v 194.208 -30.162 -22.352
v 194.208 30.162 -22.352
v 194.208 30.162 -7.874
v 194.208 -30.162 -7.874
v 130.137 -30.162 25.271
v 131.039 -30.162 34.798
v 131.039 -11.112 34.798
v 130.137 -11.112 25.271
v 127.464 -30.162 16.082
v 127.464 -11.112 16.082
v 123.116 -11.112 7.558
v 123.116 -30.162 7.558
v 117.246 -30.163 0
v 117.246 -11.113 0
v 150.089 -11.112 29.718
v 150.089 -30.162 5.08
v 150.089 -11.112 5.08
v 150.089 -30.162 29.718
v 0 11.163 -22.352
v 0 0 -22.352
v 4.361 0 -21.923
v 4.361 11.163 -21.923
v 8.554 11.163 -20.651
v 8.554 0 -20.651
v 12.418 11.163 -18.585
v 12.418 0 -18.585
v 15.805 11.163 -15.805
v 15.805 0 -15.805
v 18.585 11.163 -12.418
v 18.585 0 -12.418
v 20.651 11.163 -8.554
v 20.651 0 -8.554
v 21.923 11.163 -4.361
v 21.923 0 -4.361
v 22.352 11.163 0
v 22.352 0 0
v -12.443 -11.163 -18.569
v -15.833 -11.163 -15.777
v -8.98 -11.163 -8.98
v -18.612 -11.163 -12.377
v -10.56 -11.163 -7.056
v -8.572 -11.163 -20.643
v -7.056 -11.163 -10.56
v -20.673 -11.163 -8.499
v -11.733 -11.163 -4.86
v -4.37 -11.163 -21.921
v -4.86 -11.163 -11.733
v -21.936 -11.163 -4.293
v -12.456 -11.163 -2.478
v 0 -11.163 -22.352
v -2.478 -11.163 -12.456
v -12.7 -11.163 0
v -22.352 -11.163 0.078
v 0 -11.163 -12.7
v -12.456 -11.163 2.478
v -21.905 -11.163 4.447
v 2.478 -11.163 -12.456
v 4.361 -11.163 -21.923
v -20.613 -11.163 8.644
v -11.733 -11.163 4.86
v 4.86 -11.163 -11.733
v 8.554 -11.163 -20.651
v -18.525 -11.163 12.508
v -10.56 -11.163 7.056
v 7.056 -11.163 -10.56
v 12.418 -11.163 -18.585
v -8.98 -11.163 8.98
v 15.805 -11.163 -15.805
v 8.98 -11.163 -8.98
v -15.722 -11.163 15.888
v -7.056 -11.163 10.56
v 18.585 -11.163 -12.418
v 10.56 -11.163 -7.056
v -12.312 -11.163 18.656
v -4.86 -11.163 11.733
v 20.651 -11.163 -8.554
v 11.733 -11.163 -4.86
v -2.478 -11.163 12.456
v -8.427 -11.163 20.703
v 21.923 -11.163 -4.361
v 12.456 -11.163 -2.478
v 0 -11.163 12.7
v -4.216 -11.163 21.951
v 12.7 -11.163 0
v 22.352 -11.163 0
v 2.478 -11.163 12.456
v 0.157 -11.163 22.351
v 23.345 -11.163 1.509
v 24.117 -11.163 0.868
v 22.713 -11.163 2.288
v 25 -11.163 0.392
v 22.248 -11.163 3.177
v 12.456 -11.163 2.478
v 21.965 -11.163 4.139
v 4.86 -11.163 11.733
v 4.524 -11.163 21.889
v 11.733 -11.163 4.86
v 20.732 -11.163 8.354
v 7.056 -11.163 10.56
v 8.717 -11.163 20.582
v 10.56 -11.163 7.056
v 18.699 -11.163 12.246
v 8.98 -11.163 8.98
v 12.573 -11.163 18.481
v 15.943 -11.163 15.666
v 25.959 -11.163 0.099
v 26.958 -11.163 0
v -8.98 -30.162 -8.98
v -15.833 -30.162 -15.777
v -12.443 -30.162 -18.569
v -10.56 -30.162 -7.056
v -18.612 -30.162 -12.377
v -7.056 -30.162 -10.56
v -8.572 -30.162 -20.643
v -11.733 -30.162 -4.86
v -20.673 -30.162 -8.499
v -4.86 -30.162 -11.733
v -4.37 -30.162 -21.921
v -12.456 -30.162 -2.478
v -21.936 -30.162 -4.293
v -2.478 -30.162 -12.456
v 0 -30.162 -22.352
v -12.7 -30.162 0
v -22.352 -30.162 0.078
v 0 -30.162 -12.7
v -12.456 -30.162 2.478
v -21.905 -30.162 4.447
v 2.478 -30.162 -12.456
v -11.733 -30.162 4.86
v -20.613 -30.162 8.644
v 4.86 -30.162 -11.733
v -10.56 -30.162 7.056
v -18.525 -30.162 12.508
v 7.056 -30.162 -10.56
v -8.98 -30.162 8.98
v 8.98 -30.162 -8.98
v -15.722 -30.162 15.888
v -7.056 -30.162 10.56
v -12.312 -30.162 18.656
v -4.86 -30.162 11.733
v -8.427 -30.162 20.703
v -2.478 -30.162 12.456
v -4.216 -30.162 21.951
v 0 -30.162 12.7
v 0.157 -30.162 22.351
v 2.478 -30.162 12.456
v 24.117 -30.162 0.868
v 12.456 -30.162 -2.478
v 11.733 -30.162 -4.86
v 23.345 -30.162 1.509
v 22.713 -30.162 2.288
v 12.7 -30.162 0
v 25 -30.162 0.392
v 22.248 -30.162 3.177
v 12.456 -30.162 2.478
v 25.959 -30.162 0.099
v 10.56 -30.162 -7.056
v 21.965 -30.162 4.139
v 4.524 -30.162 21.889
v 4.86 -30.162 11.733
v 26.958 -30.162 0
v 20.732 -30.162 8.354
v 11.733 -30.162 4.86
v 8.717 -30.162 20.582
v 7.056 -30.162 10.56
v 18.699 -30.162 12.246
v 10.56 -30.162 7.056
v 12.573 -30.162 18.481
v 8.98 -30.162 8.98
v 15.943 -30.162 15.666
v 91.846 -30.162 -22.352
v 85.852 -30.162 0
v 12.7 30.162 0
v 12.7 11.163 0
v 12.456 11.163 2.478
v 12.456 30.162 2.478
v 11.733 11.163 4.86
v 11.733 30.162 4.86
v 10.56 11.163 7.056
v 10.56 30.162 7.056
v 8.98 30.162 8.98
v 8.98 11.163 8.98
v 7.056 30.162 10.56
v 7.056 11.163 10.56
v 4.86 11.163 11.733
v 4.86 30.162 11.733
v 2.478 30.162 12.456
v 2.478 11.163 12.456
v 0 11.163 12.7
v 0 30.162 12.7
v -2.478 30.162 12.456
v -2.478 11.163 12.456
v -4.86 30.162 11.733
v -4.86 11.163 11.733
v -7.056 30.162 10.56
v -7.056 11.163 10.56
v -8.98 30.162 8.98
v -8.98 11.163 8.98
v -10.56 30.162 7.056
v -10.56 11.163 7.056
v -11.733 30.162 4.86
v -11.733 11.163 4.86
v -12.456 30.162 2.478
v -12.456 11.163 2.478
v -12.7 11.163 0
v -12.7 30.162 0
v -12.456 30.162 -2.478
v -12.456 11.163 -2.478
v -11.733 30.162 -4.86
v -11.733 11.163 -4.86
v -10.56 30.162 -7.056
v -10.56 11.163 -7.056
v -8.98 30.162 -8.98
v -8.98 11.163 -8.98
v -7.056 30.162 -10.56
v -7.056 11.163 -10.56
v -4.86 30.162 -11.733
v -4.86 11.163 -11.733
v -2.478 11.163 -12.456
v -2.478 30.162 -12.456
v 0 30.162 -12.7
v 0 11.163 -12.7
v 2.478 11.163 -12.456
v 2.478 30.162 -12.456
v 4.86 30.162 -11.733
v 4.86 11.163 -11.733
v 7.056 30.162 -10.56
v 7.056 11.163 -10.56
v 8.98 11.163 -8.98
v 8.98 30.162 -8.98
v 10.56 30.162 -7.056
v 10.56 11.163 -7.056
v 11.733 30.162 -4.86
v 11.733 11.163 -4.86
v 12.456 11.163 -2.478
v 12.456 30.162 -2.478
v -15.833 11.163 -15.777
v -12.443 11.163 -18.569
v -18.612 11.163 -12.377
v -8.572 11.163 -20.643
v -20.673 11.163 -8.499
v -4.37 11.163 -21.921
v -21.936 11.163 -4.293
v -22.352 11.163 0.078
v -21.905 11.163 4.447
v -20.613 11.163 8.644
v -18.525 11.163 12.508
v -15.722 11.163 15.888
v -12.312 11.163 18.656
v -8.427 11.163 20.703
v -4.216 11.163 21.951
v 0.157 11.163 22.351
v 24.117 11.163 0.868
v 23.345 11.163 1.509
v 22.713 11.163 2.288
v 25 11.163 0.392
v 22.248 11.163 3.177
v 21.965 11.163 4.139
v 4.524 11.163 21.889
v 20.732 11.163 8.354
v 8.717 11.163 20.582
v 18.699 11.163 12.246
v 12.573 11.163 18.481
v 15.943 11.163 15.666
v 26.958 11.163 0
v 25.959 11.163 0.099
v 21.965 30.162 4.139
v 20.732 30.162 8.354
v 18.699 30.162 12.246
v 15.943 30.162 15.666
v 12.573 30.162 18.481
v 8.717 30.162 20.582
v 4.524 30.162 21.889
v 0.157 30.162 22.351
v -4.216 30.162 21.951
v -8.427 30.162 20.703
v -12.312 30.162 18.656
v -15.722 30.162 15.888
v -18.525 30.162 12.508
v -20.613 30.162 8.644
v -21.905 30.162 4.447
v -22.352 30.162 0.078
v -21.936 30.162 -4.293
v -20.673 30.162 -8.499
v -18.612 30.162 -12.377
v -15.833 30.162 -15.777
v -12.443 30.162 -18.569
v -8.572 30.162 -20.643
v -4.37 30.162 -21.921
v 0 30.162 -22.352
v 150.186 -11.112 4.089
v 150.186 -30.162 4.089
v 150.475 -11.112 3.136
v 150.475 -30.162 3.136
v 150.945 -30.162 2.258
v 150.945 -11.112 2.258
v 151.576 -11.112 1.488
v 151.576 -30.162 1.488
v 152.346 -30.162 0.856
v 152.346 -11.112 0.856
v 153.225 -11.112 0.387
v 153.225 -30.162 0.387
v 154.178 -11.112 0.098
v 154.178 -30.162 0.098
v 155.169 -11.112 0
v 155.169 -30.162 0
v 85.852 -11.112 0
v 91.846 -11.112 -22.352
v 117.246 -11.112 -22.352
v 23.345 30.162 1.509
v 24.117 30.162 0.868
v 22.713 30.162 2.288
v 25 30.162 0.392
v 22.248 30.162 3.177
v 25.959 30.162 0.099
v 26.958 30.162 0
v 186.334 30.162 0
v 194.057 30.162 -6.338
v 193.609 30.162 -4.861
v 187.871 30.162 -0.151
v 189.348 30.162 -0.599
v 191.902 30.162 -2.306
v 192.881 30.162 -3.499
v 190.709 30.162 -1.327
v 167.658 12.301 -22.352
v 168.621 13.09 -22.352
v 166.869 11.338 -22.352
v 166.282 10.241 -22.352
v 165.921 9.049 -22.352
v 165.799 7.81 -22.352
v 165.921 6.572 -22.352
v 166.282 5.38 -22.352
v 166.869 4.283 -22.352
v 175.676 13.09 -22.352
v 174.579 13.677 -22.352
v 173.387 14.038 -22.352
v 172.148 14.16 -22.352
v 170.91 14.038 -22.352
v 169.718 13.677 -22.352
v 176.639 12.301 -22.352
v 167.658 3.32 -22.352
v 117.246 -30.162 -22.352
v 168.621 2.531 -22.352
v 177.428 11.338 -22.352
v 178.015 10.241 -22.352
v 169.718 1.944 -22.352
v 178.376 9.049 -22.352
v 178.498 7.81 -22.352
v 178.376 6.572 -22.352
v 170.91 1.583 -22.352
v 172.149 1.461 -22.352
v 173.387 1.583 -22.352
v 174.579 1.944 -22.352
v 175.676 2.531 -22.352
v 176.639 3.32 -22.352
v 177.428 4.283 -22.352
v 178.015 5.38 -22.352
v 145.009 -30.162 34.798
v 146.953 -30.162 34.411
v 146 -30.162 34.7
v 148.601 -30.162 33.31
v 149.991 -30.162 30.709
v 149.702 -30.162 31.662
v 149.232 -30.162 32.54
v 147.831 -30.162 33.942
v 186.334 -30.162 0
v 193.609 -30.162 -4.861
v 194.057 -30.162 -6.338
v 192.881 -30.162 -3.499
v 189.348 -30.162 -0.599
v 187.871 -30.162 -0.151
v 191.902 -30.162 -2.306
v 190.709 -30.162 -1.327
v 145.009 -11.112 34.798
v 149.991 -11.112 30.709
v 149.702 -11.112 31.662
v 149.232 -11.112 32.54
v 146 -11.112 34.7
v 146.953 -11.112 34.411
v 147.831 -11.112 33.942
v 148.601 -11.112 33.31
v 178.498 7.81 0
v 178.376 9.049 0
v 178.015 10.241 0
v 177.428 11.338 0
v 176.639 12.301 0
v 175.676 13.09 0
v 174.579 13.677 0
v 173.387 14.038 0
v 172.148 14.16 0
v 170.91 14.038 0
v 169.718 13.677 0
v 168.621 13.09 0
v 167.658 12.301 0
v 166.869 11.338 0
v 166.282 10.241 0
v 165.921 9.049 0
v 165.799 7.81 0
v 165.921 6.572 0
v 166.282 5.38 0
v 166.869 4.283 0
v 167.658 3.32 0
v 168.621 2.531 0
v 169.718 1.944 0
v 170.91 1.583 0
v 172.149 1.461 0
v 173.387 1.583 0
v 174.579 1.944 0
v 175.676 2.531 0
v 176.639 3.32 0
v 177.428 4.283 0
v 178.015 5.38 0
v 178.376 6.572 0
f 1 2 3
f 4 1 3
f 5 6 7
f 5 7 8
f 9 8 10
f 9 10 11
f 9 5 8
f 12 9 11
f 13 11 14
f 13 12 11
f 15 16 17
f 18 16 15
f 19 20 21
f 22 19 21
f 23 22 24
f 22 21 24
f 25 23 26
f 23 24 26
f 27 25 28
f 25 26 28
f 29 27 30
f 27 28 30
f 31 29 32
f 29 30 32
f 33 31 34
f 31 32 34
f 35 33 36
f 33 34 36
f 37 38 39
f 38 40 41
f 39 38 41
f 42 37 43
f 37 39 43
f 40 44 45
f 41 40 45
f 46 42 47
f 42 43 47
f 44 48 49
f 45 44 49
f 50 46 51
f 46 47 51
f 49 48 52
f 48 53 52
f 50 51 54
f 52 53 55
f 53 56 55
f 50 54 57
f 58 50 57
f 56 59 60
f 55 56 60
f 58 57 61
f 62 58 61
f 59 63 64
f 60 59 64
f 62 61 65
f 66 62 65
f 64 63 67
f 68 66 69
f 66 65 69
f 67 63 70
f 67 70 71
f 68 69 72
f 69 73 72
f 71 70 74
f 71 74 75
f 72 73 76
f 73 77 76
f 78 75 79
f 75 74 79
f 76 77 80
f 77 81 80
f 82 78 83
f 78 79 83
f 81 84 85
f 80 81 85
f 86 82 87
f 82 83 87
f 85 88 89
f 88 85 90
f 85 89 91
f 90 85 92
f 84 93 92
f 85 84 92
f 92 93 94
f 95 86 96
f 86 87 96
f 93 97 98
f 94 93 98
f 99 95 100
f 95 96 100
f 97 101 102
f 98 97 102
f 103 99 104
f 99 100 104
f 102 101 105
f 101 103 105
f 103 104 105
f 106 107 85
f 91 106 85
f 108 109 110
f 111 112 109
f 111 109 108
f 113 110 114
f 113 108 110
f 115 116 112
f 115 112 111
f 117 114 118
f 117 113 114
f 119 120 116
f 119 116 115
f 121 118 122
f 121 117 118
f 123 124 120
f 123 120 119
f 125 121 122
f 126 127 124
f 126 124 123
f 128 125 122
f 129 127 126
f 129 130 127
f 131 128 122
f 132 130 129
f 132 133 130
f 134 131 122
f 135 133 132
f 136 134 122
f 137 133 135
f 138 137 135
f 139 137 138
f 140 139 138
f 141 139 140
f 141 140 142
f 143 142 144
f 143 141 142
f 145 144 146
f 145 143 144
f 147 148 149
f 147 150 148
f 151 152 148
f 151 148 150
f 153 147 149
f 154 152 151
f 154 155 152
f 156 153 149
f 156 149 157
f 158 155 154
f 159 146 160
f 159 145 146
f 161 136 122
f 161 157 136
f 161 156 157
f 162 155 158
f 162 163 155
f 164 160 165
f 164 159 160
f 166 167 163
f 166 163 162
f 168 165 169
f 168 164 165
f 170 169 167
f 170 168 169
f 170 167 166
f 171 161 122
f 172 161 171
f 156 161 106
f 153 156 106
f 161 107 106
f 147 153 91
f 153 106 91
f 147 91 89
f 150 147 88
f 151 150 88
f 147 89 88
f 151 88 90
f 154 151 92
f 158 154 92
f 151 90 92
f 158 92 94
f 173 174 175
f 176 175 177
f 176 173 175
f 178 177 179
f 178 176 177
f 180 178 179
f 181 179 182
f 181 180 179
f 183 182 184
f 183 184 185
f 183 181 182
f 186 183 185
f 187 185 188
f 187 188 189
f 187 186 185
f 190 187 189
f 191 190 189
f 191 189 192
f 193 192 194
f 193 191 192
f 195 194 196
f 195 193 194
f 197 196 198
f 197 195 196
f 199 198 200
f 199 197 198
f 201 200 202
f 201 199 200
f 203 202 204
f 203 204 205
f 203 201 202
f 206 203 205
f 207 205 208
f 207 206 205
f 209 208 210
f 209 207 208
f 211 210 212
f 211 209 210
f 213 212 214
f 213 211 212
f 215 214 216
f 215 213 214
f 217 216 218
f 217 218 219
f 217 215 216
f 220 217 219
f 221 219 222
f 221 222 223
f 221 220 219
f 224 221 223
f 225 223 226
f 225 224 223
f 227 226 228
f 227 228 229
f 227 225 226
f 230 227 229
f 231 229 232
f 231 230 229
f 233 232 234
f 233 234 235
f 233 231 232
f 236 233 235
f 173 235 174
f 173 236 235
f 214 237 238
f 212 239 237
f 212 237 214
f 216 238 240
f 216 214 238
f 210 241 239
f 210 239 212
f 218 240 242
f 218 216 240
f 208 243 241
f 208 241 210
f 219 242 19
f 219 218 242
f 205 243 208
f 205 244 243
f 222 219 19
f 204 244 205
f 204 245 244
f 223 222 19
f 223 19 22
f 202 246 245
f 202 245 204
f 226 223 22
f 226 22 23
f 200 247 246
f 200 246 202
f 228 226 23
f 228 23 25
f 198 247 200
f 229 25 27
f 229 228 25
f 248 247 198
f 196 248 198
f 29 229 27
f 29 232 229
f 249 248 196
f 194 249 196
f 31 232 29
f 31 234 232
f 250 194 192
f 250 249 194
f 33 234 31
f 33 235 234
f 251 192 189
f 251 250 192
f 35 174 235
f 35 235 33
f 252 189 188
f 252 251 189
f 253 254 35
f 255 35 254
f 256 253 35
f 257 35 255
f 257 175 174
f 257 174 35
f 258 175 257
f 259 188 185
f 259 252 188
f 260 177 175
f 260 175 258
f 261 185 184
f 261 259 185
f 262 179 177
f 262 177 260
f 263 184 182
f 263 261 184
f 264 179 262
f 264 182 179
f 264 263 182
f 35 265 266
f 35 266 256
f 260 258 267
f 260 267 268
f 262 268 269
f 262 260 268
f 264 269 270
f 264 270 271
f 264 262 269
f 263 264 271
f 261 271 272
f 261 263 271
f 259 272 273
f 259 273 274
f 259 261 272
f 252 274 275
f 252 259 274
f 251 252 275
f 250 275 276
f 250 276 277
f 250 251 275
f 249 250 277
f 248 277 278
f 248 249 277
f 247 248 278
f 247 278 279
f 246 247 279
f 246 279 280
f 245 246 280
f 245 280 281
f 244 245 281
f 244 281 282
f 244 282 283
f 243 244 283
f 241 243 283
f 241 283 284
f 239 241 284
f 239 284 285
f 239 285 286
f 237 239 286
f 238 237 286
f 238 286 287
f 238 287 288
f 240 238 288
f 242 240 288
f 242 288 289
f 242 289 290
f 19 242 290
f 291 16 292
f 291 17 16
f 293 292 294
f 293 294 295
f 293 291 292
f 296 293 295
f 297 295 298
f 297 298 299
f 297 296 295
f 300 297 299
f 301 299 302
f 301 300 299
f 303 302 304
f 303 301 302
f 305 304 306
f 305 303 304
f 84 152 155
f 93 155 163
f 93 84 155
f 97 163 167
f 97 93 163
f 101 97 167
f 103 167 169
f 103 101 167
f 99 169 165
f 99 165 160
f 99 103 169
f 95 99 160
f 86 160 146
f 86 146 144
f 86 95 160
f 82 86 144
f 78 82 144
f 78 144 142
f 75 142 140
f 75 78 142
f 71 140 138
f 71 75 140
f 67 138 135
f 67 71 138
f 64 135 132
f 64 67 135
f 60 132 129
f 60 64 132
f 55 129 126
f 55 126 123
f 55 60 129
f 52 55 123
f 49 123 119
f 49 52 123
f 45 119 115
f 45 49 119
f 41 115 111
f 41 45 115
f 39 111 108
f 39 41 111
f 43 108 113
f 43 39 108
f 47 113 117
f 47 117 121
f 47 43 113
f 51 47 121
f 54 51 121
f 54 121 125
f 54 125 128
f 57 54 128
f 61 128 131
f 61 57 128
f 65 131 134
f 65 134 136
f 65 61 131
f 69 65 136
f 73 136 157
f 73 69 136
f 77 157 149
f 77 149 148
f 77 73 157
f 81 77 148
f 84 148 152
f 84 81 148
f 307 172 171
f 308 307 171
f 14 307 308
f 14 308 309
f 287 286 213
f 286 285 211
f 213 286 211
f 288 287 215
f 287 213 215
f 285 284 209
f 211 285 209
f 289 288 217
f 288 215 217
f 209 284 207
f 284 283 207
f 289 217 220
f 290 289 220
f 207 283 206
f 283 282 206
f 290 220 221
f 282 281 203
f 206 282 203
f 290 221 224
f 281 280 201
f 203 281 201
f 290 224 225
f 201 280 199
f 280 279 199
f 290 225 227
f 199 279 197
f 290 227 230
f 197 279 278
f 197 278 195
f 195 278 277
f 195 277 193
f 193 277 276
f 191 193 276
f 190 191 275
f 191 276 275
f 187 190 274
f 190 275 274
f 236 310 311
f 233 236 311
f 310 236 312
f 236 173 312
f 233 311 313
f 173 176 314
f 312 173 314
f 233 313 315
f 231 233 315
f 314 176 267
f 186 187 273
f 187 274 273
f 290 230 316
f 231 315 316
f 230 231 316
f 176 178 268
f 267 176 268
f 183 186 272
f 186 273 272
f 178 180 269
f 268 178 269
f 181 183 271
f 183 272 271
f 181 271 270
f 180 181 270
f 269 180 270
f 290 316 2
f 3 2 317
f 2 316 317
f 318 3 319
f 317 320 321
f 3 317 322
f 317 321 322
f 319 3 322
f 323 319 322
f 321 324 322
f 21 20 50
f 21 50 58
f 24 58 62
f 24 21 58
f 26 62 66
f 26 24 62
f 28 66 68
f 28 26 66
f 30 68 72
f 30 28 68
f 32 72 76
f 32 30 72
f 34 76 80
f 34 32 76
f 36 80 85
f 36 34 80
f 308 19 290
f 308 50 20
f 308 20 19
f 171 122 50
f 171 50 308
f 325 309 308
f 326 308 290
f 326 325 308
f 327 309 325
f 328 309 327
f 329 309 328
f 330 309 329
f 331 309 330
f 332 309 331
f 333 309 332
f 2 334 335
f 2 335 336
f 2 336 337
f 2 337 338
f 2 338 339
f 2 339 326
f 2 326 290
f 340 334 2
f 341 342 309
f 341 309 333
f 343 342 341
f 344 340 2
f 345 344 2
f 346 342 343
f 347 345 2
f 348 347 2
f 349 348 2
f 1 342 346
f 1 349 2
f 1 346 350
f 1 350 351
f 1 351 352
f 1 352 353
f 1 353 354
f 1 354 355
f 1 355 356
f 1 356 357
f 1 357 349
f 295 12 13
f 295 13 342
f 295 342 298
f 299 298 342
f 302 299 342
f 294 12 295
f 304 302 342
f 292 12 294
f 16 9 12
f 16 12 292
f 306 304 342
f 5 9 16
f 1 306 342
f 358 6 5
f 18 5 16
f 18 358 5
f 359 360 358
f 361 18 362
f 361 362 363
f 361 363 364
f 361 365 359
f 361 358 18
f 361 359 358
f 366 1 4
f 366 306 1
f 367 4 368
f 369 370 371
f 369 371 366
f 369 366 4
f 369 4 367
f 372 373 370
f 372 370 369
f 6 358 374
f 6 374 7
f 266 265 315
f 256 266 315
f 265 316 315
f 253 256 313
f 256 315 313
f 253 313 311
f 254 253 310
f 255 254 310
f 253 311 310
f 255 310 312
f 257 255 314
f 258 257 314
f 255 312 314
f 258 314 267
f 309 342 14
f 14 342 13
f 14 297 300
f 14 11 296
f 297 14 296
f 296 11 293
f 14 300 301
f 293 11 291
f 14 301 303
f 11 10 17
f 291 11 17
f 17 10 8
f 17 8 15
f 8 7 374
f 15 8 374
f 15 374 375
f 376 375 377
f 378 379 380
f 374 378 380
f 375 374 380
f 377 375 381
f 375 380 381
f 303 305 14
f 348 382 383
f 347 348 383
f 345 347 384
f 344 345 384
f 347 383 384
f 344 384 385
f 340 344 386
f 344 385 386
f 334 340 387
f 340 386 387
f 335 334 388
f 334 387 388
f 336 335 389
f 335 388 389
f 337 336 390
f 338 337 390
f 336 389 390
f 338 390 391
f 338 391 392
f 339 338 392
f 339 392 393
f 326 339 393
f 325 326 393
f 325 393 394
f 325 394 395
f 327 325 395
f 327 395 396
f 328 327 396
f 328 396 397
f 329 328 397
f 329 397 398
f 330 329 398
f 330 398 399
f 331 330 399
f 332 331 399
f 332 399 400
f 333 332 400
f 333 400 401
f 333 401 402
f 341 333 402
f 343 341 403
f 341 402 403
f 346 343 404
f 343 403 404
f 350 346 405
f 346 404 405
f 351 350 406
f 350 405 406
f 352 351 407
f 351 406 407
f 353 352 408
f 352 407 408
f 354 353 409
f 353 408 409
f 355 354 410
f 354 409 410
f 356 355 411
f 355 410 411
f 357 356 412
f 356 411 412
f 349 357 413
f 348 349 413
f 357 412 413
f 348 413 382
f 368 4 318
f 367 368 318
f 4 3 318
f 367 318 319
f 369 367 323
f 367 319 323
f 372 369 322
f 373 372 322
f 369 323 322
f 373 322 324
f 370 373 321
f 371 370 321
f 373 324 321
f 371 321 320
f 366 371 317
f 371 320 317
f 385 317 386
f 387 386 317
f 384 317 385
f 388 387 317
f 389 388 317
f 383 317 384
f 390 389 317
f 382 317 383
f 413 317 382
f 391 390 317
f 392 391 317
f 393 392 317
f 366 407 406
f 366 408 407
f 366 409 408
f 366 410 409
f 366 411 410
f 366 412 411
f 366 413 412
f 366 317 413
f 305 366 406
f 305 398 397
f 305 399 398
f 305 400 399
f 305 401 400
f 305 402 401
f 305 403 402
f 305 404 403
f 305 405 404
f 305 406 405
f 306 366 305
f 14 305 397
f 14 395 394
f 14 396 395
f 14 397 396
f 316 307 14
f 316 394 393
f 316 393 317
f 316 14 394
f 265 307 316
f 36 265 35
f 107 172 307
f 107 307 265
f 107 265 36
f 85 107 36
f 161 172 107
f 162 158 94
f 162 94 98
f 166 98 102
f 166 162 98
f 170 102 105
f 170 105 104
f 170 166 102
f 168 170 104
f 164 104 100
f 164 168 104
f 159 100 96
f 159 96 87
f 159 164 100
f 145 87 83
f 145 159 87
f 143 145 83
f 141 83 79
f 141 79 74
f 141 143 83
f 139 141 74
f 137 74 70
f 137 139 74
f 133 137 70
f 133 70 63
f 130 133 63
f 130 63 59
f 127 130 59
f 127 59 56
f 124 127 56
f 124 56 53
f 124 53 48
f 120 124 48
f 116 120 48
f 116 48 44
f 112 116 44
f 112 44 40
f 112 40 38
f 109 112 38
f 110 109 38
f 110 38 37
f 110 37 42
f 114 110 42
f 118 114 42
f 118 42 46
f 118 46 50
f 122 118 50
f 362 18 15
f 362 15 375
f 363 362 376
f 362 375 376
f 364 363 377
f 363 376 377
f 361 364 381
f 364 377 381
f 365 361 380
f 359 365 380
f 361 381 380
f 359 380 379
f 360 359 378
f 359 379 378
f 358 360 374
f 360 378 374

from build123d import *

# Parameters (mm, degrees)
F0_R     = 12.7
F1_DEPTH = 30.1625
F2_DEPTH = 11.1633
F4_DEPTH = 19.05
F5_DEPTH = 19.05
F6_R     = 6.35
F7_DEPTH = 22.353
F8_R     = 7.874
F9_R     = 5.08
F10_R    = 5.08


with BuildPart() as f1:
    # F0 (on Front) → F1 (new body, symmetric)
    with BuildSketch(Plane.XZ):
        with BuildLine():
            ThreePointArc((0, -22.352), (15.8052507731, -15.8052507731), (22.352, 0))
            ThreePointArc((22.352, 0), (-15.8052507731, 15.8052507731), (0, -22.352))
        make_face()
        Circle(F0_R, mode=Mode.SUBTRACT)
        with BuildLine():
            Line((85.852, 0), (22.352, 0))
            ThreePointArc((22.352, 0), (15.8052507731, -15.8052507731), (0, -22.352))
            Line((0, -22.352), (91.8464, -22.352))
            Line((91.8464, -22.352), (85.852, 0))
        make_face()
        Polygon((117.2464, 0), (85.852, 0), (91.8464, -22.352), (117.2464, -22.352), align=None)
        Polygon((150.0886, 0), (117.2464, 0), (117.2464, -22.352), (194.2084, -22.352), (194.2084, 0), align=None)
    extrude(amount=F1_DEPTH, both=True)

    # F0 (on Front) → F2 (cut, symmetric)
    with BuildSketch(Plane.XZ):
        with BuildLine():
            ThreePointArc((0, -22.352), (15.8052507731, -15.8052507731), (22.352, 0))
            ThreePointArc((22.352, 0), (-15.8052507731, 15.8052507731), (0, -22.352))
        make_face()
        Circle(F0_R, mode=Mode.SUBTRACT)
    extrude(amount=F2_DEPTH, both=True, mode=Mode.SUBTRACT)

    # F3 (on face) → F4 (cut)
    with BuildSketch(Plane.XZ.offset(30.1625)):
        Polygon((117.2464, 0), (85.852, 0), (91.8464, -22.352), (117.2464, -22.352), align=None)
    extrude(amount=-F4_DEPTH, mode=Mode.SUBTRACT)

    # F3 (on face) → F5 (join)
    with BuildSketch(Plane.XZ.offset(30.1625)):
        with BuildLine():
            ThreePointArc((131.0386, 34.798), (127.4644153616, 16.0823576341), (117.2464, 0))
            Line((117.2464, 0), (150.0886, 0))
            Line((150.0886, 0), (150.0886, 34.798))
            Line((150.0886, 34.798), (131.0386, 34.798))
        make_face()
    extrude(amount=-F5_DEPTH)

    # F6 (on face) → F7 (cut, through all)
    with BuildSketch(Plane.XY):
        with Locations((172.1485, 7.8105)):
            Circle(F6_R)
    extrude(amount=-F7_DEPTH, mode=Mode.SUBTRACT)

    # F8
    f8_edges = [f1.edges().sort_by_distance(p)[0] for p in [
        (194.2084, 0, 0),
    ]]
    fillet(f8_edges, radius=F8_R)

    # F9
    f9_edges = [f1.edges().sort_by_distance(p)[0] for p in [
        (150.0886, -20.6375, 34.798),
    ]]
    fillet(f9_edges, radius=F9_R)

    # F10
    f10_edges = [f1.edges().sort_by_distance(p)[0] for p in [
        (22.352, -20.6629, 0),
        (22.352, 20.6629, 0),
        (150.0886, -20.6375, 0),
    ]]
    fillet(f10_edges, radius=F10_R)


solid = f1.part
